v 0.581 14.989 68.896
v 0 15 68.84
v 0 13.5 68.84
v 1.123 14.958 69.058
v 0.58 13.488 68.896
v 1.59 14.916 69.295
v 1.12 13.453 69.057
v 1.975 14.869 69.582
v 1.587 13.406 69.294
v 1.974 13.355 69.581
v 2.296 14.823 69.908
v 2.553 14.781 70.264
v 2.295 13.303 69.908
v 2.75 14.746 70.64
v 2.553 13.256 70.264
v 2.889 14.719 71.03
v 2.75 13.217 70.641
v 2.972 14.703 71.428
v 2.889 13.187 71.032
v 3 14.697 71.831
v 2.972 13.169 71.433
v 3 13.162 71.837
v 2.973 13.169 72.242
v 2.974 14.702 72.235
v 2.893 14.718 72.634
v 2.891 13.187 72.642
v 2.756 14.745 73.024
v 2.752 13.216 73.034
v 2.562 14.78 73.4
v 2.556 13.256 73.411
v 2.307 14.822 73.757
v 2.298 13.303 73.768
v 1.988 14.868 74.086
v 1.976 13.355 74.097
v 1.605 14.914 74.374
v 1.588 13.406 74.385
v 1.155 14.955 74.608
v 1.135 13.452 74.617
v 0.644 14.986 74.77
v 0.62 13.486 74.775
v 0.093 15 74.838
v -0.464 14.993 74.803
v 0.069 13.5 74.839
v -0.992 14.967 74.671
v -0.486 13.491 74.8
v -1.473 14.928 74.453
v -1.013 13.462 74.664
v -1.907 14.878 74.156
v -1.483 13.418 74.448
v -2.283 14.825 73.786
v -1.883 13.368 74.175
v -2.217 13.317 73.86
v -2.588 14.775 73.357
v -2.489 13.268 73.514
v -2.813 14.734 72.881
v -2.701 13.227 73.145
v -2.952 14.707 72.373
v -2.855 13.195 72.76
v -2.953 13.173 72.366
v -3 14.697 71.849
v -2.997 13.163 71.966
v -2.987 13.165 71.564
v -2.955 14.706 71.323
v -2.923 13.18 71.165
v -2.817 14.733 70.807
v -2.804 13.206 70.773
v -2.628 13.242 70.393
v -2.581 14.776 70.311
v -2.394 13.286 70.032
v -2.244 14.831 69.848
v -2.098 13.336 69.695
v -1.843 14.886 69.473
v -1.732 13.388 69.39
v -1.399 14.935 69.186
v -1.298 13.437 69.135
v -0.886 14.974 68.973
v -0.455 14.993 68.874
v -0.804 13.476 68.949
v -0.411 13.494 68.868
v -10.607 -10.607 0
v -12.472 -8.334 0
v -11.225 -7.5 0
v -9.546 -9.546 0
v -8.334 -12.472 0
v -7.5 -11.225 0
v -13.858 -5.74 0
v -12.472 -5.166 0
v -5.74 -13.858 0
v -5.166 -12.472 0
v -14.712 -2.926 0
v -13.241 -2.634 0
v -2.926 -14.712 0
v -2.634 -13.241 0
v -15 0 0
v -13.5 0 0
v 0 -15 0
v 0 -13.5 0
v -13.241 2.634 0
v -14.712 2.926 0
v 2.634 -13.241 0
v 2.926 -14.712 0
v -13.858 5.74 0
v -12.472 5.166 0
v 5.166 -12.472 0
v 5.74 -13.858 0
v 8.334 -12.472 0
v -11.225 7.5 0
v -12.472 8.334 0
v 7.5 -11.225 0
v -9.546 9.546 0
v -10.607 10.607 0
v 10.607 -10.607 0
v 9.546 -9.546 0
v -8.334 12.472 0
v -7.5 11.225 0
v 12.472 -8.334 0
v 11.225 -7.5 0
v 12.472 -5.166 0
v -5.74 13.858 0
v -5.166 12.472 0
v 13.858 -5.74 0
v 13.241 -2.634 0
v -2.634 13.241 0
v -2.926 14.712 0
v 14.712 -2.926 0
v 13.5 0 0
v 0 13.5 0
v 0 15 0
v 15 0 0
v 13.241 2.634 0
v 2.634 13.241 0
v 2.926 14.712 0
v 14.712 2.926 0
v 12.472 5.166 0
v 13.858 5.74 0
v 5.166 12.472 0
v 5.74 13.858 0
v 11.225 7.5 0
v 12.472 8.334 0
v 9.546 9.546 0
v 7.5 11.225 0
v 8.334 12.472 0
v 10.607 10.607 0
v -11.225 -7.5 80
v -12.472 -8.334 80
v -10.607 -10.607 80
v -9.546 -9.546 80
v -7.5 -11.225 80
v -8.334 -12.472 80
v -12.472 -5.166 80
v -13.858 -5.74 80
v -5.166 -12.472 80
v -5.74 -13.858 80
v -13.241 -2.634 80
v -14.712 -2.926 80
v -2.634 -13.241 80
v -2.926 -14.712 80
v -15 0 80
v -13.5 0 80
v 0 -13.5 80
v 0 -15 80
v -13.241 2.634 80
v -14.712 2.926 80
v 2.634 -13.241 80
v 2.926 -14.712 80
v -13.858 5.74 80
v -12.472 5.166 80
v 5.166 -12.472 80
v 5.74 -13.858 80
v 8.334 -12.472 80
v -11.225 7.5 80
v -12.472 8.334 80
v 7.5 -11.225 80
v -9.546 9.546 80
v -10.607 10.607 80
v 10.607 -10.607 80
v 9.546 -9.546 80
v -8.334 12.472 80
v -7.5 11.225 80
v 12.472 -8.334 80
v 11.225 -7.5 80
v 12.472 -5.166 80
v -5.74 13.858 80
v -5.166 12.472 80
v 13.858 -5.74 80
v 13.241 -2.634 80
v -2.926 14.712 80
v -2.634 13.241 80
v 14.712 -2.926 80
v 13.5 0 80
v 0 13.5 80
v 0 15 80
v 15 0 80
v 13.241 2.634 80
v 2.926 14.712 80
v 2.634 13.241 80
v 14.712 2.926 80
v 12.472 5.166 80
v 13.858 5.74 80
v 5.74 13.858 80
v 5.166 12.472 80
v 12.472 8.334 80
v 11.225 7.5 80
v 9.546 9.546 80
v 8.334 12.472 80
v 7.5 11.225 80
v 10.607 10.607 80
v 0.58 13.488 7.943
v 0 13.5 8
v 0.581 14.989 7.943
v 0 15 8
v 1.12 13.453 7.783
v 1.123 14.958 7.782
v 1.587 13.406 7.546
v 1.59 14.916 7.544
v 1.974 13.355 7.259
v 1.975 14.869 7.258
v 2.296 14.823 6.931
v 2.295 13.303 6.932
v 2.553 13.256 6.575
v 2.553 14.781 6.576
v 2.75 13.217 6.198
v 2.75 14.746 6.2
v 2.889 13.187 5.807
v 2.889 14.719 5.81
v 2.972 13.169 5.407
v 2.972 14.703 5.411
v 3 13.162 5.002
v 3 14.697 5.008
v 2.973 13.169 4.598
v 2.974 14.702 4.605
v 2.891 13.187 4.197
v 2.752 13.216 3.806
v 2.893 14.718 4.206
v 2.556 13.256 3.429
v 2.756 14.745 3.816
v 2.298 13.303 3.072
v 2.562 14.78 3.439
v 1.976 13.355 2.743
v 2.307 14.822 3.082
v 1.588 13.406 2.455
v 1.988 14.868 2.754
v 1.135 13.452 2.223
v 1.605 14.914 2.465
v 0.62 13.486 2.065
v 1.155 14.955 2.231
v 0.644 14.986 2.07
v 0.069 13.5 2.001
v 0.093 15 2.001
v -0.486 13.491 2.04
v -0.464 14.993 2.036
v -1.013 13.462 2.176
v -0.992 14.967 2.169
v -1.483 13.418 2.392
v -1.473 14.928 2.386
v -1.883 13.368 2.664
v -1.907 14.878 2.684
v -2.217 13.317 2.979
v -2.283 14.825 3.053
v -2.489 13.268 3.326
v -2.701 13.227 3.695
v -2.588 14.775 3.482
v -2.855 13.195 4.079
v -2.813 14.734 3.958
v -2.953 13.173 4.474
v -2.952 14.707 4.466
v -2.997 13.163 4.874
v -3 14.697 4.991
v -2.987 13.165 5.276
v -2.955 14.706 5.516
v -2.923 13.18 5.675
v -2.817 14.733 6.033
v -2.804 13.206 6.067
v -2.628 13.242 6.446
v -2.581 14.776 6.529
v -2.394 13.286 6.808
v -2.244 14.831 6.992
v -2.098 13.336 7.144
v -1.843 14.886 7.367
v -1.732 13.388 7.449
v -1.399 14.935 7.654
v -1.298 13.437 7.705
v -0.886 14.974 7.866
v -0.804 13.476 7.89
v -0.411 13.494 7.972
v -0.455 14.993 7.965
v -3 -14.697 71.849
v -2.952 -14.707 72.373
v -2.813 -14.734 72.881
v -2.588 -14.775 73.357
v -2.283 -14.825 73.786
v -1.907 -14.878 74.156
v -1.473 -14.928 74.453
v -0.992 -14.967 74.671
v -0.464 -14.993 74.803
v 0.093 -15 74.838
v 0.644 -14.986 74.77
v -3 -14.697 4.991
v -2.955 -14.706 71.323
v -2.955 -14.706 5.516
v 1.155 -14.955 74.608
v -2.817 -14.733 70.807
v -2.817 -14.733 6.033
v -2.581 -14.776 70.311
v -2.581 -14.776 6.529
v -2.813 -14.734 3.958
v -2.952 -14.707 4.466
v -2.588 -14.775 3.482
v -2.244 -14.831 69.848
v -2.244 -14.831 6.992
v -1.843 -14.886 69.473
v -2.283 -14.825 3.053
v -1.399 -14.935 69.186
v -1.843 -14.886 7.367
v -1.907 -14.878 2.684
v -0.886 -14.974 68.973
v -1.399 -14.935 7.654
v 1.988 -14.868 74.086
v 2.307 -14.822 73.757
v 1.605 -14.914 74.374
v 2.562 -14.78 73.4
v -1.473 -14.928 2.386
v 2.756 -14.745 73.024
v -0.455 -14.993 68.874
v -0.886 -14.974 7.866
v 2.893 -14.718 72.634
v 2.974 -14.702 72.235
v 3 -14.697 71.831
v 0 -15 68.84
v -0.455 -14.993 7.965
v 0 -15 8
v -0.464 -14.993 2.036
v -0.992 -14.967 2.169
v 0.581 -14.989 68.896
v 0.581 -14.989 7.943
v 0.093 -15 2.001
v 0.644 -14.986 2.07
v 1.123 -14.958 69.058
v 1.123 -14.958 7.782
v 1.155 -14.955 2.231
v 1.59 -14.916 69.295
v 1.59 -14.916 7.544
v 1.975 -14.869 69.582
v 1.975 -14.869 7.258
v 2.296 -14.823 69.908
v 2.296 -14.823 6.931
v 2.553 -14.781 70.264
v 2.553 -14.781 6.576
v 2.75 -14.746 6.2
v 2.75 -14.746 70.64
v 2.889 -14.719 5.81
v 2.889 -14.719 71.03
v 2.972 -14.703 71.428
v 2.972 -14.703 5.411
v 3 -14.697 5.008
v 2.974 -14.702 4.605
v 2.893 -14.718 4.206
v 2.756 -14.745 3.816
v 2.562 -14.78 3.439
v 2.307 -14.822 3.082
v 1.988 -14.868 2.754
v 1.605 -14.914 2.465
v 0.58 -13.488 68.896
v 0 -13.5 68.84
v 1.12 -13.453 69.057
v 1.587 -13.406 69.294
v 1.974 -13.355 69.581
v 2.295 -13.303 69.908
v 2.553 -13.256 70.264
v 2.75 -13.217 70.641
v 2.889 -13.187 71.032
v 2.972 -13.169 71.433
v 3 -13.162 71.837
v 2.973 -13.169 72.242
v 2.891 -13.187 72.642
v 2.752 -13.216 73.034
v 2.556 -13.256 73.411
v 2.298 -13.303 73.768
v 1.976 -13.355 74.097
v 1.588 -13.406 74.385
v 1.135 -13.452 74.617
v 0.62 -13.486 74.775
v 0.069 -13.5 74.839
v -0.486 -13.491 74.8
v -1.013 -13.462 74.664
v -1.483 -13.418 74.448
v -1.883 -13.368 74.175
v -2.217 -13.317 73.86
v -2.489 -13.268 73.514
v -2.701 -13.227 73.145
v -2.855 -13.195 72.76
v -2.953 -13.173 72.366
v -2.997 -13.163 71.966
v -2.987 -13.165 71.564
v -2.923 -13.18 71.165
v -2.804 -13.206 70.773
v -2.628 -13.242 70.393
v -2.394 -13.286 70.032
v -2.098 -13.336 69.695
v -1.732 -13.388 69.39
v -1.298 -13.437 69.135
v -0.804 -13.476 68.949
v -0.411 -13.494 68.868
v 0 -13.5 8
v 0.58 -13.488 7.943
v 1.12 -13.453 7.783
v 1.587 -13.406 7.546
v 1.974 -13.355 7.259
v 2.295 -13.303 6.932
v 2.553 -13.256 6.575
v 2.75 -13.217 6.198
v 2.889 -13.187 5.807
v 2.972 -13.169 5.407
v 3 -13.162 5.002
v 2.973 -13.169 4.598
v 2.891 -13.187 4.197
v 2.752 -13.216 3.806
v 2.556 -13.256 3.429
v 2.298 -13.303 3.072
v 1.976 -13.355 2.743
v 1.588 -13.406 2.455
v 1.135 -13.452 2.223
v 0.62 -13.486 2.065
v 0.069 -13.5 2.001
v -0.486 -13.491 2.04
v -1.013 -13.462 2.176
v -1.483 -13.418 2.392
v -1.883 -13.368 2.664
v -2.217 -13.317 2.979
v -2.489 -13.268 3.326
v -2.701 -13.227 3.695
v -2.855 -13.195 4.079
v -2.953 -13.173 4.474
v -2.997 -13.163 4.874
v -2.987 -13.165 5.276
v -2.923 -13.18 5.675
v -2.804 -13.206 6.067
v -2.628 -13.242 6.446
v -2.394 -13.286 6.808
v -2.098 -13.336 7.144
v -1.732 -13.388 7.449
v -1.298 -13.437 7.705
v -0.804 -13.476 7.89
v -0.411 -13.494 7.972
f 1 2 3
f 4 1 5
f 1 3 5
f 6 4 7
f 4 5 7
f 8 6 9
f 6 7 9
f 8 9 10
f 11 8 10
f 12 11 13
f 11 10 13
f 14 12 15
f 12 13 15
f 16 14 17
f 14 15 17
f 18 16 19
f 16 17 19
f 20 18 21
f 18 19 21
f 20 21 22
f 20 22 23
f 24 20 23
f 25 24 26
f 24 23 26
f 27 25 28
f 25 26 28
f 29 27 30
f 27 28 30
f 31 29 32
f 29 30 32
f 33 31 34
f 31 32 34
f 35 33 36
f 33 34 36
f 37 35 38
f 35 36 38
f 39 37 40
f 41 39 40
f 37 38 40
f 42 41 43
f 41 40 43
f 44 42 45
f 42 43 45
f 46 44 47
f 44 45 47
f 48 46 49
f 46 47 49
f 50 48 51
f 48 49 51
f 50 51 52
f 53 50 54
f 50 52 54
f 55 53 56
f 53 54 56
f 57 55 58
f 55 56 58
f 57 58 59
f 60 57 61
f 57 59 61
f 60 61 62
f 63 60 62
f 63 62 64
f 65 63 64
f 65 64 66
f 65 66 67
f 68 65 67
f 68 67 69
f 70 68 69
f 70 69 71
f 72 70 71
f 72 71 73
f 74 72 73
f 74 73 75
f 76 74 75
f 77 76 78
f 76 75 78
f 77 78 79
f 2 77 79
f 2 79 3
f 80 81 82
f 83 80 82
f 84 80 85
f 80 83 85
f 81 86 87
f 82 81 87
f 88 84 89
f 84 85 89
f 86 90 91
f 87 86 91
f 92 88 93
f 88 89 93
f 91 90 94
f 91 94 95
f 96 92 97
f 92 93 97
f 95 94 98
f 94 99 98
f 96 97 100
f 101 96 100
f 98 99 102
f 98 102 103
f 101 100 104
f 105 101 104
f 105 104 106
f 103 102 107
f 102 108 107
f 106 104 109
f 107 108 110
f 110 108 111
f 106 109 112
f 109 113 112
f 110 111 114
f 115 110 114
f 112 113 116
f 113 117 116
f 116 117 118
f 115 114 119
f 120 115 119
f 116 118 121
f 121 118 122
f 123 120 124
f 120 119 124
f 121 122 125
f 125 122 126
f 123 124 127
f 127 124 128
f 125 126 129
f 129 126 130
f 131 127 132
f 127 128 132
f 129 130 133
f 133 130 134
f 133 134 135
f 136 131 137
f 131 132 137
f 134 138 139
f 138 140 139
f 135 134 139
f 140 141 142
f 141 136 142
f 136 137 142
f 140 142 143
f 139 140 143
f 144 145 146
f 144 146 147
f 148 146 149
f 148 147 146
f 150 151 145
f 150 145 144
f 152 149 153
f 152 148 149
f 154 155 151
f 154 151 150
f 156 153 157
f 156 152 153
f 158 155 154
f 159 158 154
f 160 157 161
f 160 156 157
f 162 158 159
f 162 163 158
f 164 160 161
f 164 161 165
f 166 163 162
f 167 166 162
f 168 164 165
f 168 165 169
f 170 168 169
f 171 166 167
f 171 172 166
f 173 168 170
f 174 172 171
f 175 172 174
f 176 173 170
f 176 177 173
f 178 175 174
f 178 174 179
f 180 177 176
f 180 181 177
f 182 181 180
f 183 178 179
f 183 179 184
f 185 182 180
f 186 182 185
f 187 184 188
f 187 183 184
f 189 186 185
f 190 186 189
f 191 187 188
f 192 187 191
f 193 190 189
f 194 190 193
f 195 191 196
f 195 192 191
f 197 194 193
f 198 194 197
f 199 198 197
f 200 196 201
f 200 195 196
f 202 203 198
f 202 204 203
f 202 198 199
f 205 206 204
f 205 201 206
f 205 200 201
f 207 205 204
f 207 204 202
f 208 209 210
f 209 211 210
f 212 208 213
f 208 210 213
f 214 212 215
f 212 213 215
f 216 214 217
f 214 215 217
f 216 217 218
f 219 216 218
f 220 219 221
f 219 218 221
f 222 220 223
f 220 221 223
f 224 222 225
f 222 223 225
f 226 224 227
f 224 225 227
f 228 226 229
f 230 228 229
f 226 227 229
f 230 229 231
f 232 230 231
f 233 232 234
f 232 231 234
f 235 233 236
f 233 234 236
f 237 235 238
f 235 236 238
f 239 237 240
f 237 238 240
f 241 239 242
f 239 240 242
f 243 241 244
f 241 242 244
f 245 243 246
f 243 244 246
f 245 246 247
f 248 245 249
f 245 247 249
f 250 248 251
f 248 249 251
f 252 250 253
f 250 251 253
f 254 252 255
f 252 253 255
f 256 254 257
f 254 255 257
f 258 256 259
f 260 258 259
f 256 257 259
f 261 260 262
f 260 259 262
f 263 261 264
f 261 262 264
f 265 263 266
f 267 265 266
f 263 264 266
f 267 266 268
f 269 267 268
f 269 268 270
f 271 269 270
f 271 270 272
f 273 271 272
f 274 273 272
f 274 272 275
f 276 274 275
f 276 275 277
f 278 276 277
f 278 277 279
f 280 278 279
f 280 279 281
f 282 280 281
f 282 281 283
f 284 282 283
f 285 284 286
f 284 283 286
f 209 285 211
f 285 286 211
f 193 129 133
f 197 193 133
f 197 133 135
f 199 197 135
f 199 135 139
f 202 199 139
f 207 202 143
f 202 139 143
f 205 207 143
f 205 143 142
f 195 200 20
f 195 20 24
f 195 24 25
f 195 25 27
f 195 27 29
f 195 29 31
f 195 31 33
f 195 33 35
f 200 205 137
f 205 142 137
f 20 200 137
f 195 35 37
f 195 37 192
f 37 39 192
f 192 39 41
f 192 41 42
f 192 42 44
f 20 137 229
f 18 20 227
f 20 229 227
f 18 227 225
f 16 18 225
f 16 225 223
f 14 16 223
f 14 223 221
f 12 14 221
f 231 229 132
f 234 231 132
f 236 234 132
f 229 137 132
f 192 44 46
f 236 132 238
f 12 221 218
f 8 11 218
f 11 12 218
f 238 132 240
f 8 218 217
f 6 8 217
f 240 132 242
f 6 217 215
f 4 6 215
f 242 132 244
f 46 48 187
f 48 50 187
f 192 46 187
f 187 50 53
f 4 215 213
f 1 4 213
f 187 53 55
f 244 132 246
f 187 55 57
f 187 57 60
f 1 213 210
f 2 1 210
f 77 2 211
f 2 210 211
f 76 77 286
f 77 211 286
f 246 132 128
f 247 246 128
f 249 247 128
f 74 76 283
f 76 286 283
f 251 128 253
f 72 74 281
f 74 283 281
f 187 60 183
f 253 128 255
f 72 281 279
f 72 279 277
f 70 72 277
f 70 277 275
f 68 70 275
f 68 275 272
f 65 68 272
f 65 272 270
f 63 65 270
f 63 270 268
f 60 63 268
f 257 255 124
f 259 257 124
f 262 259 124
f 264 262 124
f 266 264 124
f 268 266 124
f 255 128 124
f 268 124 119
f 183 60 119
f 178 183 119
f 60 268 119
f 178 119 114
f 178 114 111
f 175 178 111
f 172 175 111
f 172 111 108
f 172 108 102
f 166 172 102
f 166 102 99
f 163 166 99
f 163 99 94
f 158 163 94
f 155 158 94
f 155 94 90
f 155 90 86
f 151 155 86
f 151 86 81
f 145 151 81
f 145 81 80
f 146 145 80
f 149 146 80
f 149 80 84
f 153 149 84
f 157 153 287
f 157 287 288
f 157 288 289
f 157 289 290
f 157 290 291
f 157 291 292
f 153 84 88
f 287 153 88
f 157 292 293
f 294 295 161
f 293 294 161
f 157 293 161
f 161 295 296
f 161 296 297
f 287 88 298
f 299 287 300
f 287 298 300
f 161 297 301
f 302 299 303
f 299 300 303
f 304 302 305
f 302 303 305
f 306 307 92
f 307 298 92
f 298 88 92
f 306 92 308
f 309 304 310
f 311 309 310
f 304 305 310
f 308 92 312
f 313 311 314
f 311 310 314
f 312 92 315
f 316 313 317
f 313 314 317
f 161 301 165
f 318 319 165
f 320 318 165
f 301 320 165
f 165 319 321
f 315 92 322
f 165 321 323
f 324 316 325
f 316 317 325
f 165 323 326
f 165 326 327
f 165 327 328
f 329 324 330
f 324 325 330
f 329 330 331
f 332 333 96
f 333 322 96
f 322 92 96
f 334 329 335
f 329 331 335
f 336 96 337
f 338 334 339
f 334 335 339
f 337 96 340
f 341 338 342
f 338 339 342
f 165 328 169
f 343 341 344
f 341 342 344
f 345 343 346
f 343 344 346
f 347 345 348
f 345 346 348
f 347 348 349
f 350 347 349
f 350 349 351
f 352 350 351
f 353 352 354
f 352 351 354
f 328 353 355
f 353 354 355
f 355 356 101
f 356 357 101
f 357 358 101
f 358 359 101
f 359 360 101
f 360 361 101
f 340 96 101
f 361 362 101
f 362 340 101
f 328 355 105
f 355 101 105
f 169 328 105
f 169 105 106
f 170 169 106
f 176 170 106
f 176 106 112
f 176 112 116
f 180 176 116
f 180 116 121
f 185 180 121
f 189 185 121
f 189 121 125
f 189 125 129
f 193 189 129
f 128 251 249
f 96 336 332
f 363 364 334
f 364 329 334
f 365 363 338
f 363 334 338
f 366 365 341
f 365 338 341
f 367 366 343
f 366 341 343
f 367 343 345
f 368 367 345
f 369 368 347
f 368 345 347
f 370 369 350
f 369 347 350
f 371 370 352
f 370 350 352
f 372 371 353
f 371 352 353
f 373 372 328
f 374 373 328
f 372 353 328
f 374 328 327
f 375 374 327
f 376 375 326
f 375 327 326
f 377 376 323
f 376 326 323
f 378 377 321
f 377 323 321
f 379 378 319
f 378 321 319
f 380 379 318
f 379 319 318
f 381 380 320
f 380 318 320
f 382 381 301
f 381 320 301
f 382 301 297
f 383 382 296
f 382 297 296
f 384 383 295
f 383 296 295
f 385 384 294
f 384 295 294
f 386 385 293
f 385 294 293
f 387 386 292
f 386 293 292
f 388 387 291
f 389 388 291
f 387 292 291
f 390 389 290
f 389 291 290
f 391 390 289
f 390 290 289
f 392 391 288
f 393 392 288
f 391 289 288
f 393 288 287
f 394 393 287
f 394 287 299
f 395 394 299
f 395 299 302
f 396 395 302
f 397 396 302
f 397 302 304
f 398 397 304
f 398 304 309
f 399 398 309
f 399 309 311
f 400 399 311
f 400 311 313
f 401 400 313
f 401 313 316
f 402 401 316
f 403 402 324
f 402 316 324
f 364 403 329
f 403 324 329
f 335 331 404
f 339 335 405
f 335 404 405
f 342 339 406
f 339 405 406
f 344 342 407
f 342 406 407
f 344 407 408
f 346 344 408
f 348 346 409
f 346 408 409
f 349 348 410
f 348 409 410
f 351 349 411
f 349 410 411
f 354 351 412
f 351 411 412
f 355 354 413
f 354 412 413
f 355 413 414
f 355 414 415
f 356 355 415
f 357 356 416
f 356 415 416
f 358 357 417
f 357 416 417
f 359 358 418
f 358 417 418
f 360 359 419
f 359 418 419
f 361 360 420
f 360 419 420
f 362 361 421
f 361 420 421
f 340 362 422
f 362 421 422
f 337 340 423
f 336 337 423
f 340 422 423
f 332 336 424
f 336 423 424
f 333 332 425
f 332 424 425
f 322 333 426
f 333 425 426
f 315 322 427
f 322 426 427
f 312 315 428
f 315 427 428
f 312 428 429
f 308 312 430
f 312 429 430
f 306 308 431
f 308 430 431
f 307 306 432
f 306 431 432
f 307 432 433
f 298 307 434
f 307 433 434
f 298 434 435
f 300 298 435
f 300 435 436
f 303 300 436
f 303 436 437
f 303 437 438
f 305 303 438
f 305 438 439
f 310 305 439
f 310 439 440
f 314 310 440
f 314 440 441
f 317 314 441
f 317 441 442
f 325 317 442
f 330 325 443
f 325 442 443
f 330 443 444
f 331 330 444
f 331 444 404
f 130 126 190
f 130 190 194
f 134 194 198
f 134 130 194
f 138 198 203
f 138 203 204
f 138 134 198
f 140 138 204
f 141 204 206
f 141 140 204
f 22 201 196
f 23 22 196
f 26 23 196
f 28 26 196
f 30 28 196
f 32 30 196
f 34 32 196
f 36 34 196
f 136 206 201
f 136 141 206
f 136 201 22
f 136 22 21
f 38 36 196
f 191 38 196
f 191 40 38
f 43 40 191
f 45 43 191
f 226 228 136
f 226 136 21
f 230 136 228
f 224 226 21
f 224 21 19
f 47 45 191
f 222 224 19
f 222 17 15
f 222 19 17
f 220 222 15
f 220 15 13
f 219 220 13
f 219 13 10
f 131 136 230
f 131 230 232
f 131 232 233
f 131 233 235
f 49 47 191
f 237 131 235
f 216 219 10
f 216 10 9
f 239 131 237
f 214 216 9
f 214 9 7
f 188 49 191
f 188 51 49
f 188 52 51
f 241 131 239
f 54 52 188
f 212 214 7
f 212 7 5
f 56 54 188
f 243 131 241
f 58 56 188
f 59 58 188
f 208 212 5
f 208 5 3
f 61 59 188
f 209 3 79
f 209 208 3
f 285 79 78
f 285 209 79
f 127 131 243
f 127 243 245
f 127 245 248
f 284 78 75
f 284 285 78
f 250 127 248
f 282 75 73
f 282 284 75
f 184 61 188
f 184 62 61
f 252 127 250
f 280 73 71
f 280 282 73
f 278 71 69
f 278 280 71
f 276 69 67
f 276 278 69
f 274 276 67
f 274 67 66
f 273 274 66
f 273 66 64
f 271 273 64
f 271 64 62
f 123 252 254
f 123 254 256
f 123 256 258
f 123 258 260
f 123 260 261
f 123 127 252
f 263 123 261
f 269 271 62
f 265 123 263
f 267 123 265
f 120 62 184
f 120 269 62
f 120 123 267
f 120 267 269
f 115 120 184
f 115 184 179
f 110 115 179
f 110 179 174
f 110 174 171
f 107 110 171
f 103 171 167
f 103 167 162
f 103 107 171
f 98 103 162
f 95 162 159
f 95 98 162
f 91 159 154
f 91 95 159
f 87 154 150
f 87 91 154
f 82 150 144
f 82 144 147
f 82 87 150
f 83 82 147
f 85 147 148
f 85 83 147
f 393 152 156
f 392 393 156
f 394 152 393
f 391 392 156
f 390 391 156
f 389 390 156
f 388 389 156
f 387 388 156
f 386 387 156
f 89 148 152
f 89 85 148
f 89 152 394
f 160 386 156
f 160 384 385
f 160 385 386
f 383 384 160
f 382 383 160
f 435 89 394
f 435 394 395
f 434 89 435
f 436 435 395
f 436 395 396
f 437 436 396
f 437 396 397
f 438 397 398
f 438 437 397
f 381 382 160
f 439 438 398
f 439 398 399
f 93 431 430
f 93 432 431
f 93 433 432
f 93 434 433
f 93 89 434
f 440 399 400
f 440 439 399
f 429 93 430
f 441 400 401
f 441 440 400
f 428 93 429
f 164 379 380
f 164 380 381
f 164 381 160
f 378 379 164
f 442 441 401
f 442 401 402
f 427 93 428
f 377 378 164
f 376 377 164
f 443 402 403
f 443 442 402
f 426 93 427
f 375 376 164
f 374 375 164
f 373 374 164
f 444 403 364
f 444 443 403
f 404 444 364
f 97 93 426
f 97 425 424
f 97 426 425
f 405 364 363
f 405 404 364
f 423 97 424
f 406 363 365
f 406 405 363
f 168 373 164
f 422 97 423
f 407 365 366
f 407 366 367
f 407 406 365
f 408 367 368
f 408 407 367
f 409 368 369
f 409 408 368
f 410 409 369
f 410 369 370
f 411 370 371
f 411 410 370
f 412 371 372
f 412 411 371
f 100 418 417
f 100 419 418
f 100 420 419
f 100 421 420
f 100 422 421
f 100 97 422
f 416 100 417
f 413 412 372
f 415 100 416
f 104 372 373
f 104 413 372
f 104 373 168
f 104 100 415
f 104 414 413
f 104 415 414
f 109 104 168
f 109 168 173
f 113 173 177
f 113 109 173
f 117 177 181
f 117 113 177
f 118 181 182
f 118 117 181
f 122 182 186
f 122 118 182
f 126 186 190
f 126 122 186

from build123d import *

# Parameters (mm, degrees)
SKETCH1_R           = 15
SKETCH1_R_2         = 13.5
BOSS_EXTRUDE1_DEPTH = 80
SKETCH2_R           = 3
CUT_EXTRUDE1_DEPTH  = 33
SKETCH3_R           = 3
CUT_EXTRUDE2_DEPTH  = 33


with BuildPart() as part:
    # Sketch1 → Boss-Extrude1 (new body)
    with BuildSketch(Plane.XY):
        Circle(SKETCH1_R)
        Circle(SKETCH1_R_2, mode=Mode.SUBTRACT)
    extrude(amount=BOSS_EXTRUDE1_DEPTH)

    # Sketch2 → Cut-Extrude1 (cut, symmetric)
    with BuildSketch(Plane(origin=(0, 0, 0), x_dir=(1, 0, 0), z_dir=(0, 1, 0))):
        with Locations(Location((0, -5, 0), (0, 0, 270))):
            Circle(SKETCH2_R)
    extrude(amount=CUT_EXTRUDE1_DEPTH, both=True, mode=Mode.SUBTRACT)

    # Sketch3 → Cut-Extrude2 (cut, symmetric)
    with BuildSketch(Plane.XZ):
        with Locations(Location((0, 71.839569, 0), (0, 0, 270))):
            Circle(SKETCH3_R)
    extrude(amount=CUT_EXTRUDE2_DEPTH, both=True, mode=Mode.SUBTRACT)


solid = part.part
